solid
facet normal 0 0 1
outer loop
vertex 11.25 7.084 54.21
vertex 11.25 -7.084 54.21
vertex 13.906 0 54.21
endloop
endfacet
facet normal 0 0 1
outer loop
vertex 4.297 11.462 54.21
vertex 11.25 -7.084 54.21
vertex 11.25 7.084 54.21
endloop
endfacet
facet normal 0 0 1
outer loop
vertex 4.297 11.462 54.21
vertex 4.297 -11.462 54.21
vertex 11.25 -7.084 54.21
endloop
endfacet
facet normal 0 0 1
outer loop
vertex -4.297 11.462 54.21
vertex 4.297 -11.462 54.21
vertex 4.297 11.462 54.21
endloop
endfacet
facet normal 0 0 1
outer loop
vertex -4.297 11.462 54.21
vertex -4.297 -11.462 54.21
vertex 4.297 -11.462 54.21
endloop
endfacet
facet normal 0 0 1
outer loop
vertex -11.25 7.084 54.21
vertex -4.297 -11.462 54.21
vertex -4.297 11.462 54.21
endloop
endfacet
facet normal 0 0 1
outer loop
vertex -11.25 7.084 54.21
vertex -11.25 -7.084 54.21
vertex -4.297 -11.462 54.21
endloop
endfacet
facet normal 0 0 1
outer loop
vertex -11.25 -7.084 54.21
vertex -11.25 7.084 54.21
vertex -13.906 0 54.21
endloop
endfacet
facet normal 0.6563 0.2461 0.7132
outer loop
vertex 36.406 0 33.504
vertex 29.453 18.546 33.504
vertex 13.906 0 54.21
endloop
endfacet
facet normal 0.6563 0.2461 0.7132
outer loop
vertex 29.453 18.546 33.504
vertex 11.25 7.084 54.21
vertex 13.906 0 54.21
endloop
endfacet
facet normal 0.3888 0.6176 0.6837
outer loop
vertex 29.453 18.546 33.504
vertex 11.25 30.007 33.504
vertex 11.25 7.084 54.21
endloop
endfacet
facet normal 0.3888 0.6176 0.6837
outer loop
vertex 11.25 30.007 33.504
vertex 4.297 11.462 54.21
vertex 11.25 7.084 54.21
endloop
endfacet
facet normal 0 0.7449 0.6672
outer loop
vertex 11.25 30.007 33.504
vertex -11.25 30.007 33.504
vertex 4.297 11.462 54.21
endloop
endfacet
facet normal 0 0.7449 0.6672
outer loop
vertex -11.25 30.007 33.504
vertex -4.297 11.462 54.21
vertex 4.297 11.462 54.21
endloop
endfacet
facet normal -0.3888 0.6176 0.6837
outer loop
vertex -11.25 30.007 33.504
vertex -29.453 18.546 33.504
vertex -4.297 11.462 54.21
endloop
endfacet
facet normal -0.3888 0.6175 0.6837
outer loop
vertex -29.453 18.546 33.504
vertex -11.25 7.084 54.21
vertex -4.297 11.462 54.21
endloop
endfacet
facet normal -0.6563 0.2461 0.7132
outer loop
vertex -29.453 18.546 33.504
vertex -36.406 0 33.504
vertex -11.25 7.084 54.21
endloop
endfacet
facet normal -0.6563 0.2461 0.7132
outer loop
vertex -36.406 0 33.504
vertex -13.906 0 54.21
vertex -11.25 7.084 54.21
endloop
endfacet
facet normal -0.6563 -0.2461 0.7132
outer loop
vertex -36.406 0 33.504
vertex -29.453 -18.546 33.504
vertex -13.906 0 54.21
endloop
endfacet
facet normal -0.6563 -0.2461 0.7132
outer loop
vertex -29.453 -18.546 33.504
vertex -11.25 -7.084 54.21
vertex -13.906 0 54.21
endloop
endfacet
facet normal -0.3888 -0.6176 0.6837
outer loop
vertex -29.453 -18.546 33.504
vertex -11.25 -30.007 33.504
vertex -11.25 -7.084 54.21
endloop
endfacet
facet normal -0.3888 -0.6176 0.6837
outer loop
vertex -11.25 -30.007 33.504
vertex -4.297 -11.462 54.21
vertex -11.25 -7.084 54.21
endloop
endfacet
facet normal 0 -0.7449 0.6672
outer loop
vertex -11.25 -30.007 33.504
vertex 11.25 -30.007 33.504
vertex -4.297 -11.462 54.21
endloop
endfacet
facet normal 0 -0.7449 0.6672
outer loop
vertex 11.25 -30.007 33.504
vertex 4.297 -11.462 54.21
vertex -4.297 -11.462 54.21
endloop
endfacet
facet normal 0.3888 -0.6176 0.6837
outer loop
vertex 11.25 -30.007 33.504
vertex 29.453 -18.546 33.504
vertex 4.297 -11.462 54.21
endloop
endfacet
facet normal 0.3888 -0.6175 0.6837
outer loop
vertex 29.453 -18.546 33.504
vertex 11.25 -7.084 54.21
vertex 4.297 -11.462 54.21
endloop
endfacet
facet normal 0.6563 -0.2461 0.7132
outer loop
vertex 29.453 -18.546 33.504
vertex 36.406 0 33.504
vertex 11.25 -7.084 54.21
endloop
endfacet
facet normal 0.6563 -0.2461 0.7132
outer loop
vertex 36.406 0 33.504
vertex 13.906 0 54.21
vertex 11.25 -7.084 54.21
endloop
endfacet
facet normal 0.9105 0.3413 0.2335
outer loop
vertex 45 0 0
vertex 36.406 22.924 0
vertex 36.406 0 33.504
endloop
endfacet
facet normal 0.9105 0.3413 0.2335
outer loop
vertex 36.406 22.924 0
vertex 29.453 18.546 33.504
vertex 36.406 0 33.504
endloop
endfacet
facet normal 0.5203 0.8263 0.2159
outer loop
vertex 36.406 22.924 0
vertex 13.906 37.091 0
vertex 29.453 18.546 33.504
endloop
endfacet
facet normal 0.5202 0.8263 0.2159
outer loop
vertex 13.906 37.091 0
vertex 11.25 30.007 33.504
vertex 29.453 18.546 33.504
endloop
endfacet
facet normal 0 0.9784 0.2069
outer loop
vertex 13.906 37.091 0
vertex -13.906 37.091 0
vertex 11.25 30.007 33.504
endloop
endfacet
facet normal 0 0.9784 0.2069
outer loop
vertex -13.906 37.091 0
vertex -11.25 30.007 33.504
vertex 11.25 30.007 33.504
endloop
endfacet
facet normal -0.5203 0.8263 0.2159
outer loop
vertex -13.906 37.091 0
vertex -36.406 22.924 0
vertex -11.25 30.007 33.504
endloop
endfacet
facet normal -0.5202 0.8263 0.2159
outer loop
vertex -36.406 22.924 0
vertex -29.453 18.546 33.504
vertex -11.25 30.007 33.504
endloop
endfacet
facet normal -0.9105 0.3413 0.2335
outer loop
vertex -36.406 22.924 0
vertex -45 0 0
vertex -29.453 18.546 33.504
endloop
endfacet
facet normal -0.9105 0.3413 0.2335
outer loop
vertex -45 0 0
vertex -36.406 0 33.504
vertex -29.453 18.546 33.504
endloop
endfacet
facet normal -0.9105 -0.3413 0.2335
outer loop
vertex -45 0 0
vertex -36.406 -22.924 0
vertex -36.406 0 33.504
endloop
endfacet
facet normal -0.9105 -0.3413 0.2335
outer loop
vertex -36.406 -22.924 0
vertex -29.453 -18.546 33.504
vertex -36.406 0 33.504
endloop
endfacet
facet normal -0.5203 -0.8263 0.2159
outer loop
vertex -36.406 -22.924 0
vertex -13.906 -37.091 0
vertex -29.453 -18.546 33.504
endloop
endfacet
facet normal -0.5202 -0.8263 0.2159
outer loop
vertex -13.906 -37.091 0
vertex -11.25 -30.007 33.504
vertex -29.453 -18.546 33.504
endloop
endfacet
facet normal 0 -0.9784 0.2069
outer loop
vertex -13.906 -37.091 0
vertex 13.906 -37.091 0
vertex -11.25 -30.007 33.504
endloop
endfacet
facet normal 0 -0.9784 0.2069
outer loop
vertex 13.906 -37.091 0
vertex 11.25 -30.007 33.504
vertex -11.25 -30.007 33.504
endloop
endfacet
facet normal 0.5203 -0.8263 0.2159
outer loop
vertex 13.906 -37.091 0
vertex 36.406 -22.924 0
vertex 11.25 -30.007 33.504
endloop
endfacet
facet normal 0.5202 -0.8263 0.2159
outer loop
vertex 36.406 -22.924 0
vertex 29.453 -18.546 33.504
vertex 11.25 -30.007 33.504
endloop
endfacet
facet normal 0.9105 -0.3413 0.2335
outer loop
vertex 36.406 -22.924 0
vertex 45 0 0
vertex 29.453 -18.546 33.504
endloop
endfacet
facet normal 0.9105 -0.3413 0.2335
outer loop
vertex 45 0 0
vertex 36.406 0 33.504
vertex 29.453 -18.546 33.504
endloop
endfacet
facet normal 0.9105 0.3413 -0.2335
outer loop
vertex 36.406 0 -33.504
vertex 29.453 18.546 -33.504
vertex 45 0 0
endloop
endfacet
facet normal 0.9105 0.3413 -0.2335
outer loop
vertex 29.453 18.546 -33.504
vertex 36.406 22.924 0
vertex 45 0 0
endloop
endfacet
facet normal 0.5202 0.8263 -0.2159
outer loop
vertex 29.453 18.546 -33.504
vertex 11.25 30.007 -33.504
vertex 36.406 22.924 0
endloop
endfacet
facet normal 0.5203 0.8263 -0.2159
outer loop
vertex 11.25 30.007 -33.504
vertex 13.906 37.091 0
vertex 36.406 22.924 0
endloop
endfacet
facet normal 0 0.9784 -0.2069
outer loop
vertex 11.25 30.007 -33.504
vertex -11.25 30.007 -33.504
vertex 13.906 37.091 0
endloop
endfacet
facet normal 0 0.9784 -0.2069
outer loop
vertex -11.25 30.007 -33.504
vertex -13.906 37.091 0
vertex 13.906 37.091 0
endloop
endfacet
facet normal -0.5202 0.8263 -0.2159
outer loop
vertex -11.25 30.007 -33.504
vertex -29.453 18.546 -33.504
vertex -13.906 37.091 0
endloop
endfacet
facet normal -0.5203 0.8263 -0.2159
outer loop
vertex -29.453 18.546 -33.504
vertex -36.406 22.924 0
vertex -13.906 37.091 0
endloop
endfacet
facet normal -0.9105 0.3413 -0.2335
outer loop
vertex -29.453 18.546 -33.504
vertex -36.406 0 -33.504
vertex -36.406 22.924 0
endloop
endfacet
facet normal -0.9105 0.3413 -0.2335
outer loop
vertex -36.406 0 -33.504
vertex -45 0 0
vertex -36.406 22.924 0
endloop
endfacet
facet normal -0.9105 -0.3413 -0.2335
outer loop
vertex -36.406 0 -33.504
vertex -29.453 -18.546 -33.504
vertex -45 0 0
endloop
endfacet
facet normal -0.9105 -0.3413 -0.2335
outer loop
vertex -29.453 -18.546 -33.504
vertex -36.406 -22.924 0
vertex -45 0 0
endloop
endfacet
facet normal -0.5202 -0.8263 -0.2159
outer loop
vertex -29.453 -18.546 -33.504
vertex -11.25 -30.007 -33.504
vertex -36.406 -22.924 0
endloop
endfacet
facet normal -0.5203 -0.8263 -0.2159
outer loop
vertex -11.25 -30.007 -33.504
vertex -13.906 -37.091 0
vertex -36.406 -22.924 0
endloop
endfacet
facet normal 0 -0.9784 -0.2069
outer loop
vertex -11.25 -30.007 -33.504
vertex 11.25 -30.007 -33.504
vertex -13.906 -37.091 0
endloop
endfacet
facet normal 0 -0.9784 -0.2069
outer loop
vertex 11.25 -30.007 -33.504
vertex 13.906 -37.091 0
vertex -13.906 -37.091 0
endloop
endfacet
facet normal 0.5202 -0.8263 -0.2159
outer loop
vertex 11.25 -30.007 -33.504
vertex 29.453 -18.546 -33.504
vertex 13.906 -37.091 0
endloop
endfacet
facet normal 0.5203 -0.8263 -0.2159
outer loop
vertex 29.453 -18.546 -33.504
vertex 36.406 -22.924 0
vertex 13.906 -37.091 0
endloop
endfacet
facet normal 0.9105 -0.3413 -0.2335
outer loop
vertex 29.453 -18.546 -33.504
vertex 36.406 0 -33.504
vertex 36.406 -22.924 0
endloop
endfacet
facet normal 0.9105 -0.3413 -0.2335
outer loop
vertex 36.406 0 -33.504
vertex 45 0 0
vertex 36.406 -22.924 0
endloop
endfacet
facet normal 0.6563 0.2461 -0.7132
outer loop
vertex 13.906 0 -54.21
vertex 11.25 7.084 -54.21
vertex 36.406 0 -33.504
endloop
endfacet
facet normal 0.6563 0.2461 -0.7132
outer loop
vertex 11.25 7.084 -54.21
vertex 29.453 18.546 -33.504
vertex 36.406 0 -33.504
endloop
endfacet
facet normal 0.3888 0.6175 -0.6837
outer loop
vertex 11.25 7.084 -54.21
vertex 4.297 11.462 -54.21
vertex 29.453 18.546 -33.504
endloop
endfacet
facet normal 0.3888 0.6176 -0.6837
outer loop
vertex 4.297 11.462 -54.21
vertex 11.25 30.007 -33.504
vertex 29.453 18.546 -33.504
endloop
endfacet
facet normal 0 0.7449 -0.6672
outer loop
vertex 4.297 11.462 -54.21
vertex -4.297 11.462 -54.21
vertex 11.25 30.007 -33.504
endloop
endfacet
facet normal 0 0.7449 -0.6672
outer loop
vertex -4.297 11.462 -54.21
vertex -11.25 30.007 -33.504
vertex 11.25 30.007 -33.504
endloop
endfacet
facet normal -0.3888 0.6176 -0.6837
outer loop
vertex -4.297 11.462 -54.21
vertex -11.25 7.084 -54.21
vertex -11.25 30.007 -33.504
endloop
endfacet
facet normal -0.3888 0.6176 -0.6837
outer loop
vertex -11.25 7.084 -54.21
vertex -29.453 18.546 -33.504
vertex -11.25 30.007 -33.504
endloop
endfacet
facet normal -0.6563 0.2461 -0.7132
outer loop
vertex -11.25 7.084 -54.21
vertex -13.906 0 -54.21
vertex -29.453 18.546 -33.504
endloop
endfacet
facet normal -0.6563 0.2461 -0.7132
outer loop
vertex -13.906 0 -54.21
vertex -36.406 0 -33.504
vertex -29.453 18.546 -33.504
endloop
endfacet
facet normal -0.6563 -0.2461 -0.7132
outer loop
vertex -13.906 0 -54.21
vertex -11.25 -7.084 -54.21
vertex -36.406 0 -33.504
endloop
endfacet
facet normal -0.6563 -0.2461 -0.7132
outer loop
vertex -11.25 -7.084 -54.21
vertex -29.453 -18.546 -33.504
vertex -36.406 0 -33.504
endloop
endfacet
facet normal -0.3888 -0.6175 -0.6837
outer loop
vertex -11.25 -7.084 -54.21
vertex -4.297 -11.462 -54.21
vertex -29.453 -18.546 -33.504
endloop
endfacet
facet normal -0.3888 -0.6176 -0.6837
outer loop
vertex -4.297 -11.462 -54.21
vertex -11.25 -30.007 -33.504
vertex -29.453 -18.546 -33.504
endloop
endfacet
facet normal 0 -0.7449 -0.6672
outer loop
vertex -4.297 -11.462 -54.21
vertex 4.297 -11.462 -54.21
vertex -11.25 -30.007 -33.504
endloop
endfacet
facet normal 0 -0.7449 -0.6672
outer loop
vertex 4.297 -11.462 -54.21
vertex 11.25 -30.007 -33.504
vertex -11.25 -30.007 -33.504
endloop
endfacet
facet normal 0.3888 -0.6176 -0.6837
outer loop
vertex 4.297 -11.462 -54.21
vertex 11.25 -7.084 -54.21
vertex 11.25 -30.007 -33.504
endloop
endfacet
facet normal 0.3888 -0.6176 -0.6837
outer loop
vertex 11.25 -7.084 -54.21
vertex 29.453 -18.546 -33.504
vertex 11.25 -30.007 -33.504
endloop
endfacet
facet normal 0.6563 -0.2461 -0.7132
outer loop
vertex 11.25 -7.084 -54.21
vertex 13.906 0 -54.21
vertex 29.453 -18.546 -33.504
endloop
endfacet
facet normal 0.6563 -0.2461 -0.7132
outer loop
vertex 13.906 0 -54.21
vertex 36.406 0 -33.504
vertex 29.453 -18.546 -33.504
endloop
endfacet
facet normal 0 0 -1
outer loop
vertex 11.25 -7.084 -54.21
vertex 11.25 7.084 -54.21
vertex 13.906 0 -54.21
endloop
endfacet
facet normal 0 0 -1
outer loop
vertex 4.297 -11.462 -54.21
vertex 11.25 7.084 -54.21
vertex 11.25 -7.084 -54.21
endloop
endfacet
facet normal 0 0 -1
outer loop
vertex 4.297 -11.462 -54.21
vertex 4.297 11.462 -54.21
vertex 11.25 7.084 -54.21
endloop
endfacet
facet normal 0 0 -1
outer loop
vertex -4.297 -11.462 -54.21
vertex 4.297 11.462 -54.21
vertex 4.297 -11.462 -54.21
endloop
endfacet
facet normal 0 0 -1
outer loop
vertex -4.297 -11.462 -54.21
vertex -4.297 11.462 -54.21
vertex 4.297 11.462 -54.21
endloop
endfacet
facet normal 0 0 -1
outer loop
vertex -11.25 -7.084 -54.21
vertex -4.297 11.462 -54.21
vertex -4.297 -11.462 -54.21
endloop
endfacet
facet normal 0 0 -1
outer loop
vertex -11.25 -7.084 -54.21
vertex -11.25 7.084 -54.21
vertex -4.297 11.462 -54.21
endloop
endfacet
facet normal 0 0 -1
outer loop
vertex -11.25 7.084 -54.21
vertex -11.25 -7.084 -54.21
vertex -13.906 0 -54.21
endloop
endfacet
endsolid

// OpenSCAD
// Generated by SolidPython 1.0.1 on 2020-07-29 00:46:52


scale(v = [15, 13, 19]) {
	sphere(r = 3);
}
/***********************************************
*********      SolidPython code:      **********
************************************************
 
# import packages: SolidPython
from solid import *
from solid.utils import *
from itertools import chain, combinations, permutations


class Resize:

    def __init__(self, scad_file):
        self.scad_file = scad_file
        #self.scad_file = import_scad(scad_file)
        # cone/cylinder param:
        self.r1 = 0
        self.r2 = 0
        self.h = 0
        # rectangular prism param:
        self.w = 0
        self.l = 0
        # ellipse param:
        self.r = 0

    # import OpenScad code (file name corresponds to shape)


    # classify shape + parameters
    def assign(self, param1, param2, param3):
        if self.scad_file == 'cone.scad':
            self.r1 = param1
            self.r2 = param2
            self.h = param3
        elif self.scad_file == 'cylinder.scad':
            self.r1 = param1
            self.r2 = param2
            self.h = param3
        elif self.scad_file == 'rectangularPrism.scad':
            self.h = param1
            self.l = param2
            self.w = param3
        else:
            self.r = param1
            self.h = param2

    # resize parameters
    def iterate(self):
        x = range(3, 20, 2)
        i = 1
        if self.scad_file == 'cone.scad':
            tempList = list(permutations(x, 2))
            for temp in tempList:
                param1 = temp[0]
                param2 = temp[1]
                filepath = 'produced_scad_files/' + 'cone' + str(param1) + '_' + str(param2) + '_' + '.scad'
                scad_render_to_file(cylinder(h=param1, r1=param2, r2=0), filepath)

        elif self.scad_file == 'cylinder.scad':
            tempList = list(permutations(x, 3))
            for temp in tempList:
                param1 = temp[0]
                param2 = temp[1]
                filepath = 'produced_scad_files/' + 'cylinder' + str(param1) + '_' + str(param2) + '_' + '.scad'
                scad_render_to_file(cylinder(h=param1, r1=param2, r2=param2), filepath)

        elif self.scad_file == 'rectangularPrism.scad':
            tempList = list(permutations(x, 3))
            for temp in tempList:
                param1 = temp[0]
                param2 = temp[1]
                param3 = temp[2]
                filepath = 'produced_scad_files/' + 'rectangularPrism' + str(param1) + '_' + str(param2) + '_' + str(
                    param3) + '.scad'
                scad_render_to_file(cube(size=(param1, param2, param3)), filepath)

        elif self.scad_file == 'ellipse.scad':
            tempList = list(permutations(x, 4))
            for temp in tempList:
                param1 = temp[0]
                param2 = temp[1]
                param3 = temp[2]
                param4 = temp[3]
                filepath = 'produced_scad_files/' + 'ellipse' + str(param1) + '_' + str(param2) + '_' + str(param3) + '_' + str(param4) + '.scad'
                scad_render_to_file(scale([param1, param2, param3])(sphere(r=param4)), filepath)

    def render_to_scadfile(self):
        scad_render_to_file(scad, 'example.scad') 
 
************************************************/
